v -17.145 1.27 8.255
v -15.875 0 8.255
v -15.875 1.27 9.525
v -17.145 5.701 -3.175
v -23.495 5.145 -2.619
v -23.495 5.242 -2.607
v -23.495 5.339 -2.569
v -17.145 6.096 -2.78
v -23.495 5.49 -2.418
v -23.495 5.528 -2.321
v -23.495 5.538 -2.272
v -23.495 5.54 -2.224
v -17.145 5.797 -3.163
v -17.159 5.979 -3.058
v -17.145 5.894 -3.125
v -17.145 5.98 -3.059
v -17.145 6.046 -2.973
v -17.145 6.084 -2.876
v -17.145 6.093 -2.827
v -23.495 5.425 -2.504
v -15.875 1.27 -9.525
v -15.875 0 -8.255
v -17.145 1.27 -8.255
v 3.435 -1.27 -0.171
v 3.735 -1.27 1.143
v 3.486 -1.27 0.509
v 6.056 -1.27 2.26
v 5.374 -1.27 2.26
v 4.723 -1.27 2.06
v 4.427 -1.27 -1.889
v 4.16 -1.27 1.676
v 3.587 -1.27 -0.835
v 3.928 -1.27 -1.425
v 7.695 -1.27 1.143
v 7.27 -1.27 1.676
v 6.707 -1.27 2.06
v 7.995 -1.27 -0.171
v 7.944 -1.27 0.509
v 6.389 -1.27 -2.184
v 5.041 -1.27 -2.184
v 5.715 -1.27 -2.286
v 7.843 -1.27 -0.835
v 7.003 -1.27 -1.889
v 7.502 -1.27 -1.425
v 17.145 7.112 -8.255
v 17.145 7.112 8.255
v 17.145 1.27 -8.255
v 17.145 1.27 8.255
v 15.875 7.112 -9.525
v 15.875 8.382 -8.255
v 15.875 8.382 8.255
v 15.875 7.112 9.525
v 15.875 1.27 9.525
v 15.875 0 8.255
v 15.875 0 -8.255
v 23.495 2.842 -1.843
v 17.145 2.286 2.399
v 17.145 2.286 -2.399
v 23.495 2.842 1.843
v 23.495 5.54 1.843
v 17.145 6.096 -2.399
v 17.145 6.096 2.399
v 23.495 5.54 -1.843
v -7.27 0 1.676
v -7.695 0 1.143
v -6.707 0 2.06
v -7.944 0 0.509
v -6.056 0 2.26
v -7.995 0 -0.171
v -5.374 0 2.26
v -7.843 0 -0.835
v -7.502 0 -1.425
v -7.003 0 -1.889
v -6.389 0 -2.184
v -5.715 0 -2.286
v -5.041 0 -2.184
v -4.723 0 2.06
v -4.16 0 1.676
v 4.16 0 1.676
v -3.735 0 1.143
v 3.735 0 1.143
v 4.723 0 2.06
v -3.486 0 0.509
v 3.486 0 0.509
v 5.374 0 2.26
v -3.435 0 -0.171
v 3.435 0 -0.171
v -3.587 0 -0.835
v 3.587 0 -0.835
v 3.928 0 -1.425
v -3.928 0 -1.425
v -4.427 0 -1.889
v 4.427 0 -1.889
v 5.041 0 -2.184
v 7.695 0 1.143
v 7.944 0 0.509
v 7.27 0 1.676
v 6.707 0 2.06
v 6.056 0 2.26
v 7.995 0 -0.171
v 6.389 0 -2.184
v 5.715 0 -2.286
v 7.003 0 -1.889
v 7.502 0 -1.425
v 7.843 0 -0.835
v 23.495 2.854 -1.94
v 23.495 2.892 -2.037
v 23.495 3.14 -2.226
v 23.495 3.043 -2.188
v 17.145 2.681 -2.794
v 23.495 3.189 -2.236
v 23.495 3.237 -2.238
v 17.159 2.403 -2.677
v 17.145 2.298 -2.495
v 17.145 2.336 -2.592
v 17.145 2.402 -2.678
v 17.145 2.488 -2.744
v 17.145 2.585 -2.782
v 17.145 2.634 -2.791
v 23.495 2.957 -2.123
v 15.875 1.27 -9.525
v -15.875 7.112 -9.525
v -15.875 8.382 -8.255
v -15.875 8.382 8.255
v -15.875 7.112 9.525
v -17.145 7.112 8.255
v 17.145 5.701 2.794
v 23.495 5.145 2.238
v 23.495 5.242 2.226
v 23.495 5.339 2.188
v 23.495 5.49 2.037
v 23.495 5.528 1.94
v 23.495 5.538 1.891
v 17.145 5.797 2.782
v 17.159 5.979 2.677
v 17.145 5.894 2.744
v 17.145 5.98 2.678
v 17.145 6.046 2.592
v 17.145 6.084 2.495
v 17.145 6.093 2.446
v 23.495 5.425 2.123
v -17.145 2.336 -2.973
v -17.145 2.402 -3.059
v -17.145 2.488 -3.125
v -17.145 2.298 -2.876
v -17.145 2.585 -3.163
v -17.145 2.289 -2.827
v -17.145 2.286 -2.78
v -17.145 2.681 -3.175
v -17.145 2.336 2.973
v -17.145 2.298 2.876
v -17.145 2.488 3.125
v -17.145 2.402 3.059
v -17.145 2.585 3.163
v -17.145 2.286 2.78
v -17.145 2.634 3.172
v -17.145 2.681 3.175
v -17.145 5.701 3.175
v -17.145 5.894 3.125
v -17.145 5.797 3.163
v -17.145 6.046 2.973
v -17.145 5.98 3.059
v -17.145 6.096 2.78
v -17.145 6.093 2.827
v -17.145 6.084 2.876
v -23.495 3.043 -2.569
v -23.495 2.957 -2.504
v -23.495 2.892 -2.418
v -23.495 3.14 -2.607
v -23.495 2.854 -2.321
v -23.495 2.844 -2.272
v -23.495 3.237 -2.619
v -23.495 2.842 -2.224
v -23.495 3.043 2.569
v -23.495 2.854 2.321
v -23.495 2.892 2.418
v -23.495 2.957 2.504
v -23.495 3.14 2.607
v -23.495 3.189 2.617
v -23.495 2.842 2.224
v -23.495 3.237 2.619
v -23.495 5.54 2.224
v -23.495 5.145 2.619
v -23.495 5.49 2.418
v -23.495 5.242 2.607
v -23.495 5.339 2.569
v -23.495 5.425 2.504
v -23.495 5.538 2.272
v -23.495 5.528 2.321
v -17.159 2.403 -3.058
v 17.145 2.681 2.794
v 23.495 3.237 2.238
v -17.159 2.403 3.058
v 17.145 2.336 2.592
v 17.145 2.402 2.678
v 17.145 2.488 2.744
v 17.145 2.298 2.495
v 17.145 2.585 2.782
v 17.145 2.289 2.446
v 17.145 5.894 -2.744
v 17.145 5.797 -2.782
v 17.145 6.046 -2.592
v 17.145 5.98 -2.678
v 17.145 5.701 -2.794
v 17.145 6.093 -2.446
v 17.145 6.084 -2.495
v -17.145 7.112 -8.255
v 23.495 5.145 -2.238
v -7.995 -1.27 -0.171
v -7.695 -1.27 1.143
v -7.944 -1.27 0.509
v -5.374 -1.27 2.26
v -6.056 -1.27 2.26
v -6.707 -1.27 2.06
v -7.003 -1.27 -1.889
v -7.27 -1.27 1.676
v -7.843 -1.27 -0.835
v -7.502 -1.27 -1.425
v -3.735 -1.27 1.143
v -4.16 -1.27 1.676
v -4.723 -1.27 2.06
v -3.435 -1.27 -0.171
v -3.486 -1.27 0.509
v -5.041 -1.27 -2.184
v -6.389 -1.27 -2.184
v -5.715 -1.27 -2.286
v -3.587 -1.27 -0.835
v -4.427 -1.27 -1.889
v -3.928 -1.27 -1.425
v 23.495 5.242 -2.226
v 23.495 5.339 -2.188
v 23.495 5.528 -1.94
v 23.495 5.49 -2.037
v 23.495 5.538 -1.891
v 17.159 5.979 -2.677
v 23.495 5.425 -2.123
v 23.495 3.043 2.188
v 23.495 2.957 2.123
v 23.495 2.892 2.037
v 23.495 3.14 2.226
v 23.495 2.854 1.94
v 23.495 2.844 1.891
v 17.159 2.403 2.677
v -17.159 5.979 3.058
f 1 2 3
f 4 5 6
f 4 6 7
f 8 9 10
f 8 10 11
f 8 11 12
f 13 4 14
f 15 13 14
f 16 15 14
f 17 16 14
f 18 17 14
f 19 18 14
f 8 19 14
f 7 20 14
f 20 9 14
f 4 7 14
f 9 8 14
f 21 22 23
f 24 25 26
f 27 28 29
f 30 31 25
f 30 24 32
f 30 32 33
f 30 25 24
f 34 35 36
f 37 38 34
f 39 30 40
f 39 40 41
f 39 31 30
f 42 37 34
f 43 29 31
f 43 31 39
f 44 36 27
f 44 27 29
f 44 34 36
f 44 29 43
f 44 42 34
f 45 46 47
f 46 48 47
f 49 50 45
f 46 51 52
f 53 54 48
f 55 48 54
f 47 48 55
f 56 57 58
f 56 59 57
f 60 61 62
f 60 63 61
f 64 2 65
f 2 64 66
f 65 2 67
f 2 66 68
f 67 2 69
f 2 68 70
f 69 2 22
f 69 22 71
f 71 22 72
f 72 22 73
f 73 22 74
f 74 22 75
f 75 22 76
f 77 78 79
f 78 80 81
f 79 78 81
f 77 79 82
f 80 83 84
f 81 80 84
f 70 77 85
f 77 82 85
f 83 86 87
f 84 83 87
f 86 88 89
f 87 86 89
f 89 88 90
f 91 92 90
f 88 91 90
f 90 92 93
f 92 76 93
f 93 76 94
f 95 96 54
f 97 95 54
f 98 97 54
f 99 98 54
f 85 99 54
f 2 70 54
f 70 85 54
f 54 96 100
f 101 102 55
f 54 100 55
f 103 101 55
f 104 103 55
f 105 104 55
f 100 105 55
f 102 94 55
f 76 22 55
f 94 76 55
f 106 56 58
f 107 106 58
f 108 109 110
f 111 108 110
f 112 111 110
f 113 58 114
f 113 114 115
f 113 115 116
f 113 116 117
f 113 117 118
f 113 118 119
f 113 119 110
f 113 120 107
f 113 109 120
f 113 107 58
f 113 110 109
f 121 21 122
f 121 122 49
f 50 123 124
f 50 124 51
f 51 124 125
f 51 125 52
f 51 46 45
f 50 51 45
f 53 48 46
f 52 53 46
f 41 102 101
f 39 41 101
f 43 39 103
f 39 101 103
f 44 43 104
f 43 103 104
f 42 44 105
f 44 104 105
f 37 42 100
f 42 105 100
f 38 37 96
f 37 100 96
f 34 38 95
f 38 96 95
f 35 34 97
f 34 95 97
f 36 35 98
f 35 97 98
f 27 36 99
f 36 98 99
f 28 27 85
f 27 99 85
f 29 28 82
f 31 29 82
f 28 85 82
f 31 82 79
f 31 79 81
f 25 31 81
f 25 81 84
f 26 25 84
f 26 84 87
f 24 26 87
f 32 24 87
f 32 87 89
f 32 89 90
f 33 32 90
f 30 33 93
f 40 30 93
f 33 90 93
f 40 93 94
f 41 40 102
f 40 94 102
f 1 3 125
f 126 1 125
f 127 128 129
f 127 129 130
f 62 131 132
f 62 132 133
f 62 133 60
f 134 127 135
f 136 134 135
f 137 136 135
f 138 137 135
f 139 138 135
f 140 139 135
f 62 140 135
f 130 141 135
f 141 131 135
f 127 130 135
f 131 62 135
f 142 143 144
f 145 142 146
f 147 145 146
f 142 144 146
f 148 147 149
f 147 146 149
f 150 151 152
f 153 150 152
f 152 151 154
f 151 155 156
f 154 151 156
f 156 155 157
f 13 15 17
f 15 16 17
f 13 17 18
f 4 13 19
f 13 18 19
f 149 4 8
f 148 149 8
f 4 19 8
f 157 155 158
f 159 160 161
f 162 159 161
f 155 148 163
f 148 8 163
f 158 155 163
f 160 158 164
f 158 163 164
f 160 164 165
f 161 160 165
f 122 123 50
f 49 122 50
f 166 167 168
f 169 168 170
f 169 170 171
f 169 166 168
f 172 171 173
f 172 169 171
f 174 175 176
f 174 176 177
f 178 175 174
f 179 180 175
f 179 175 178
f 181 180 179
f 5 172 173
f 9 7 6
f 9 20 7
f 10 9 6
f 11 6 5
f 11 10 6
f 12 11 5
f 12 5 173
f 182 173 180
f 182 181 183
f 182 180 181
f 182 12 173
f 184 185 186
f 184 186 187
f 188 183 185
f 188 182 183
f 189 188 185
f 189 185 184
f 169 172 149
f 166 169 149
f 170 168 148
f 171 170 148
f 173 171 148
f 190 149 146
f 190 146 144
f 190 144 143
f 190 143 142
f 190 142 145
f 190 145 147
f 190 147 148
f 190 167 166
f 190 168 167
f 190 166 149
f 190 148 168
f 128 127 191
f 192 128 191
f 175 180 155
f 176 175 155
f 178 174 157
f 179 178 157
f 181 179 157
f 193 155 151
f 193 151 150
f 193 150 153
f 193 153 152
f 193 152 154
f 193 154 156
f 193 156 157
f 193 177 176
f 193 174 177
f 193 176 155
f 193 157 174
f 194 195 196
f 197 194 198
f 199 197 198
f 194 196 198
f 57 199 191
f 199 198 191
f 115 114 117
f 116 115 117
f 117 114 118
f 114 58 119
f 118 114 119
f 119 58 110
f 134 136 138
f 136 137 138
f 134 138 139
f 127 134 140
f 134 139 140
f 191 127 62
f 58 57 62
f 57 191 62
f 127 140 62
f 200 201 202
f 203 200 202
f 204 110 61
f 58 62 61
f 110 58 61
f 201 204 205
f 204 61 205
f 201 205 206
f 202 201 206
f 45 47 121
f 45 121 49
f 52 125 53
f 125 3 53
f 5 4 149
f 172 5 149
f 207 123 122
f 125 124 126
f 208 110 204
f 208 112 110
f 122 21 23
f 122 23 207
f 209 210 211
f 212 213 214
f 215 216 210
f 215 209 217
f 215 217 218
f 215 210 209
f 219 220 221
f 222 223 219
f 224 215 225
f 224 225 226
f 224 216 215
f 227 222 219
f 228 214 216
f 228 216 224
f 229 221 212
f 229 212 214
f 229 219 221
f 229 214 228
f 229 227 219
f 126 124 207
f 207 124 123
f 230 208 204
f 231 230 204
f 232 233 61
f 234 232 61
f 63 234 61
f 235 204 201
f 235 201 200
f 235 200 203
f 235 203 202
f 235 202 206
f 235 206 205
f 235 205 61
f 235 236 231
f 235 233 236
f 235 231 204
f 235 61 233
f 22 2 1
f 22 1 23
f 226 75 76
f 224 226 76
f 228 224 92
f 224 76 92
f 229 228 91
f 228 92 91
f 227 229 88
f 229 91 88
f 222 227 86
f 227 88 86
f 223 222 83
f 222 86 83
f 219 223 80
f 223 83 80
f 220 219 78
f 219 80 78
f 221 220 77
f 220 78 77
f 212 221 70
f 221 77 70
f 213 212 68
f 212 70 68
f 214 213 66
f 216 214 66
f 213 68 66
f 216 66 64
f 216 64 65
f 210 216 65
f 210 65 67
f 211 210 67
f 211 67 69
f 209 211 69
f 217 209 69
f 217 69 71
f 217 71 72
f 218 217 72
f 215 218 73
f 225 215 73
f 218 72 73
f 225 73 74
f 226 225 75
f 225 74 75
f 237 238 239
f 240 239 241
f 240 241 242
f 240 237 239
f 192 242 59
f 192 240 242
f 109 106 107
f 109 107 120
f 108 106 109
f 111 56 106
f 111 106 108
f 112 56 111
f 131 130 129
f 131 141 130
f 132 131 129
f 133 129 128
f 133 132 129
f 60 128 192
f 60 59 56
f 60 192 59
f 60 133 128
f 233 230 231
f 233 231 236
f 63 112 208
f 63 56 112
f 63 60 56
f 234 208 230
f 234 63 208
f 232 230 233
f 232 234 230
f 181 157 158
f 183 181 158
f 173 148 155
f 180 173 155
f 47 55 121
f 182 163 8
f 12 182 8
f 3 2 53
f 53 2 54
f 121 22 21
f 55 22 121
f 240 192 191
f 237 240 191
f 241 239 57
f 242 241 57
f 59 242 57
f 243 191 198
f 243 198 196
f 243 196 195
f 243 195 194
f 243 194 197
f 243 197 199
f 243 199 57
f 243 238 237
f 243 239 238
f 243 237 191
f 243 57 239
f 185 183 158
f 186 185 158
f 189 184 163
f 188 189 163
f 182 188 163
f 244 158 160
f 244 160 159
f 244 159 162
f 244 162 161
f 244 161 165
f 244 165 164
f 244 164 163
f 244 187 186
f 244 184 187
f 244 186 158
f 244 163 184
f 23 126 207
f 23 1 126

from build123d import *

# Parameters (mm, degrees)
SKETCH1_W           = 34.29
SKETCH1_H           = 19.05
BOSS_EXTRUDE1_DEPTH = 8.382
SKETCH2_R           = 2.286
BOSS_EXTRUDE2_DEPTH = 1.27
SKETCH3_W           = 6.35
SKETCH3_H           = 3.81
BOSS_EXTRUDE3_DEPTH = 6.35
BOSS_EXTRUDE3_TAPER = 5
SKETCH4_W           = 5.588
SKETCH4_H           = 3.81
BOSS_EXTRUDE4_DEPTH = 6.35
BOSS_EXTRUDE4_TAPER = 5
CHAMFER1_SIZE       = 1.27
FILLET1_R           = 0.396875
FILLET2_R           = 0.396875


with BuildPart() as part:
    # Sketch1 → Boss-Extrude1 (new body)
    with BuildSketch(Plane(origin=(0, 0, 0), x_dir=(1, 0, 0), z_dir=(0, 1, 0))):
        Rectangle(SKETCH1_W, SKETCH1_H)
    extrude(amount=BOSS_EXTRUDE1_DEPTH)

    # Sketch2 → Boss-Extrude2 (add)
    with BuildSketch(Plane(origin=(0, 0, 0), x_dir=(-1, 0, 0), z_dir=(0, -1, 0))):
        with Locations(Location((5.715, 0, 0), (0, 0, 90))):
            Circle(SKETCH2_R)
        with Locations(Location((-5.715, 0, 0), (0, 0, 90))):
            Circle(SKETCH2_R)
    extrude(amount=BOSS_EXTRUDE2_DEPTH)

    # Chamfer1
    chamfer1_edges = [part.edges().sort_by_distance(p)[0] for p in [
        (-17.145, 8.382, 0),
        (0, 8.382, 9.525),
        (17.145, 8.382, 0),
        (0, 0, 9.525),
        (-17.145, 0, 0),
        (0, 0, -9.525),
        (17.145, 0, 0),
        (0, 8.382, -9.525),
        (17.145, 4.191, 9.525),
        (-17.145, 4.191, 9.525),
        (-17.145, 4.191, -9.525),
        (17.145, 4.191, -9.525),
    ]]
    chamfer(chamfer1_edges, length=CHAMFER1_SIZE)


with BuildPart() as body_2:
    # Sketch3 → Boss-Extrude3 (new body)
    with BuildSketch(Plane.ZY.offset(17.145)):
        with Locations((0, 4.191)):
            Rectangle(SKETCH3_W, SKETCH3_H)
    extrude(amount=BOSS_EXTRUDE3_DEPTH, taper=BOSS_EXTRUDE3_TAPER)

    # Fillet2
    fillet2_edges = [body_2.edges().sort_by_distance(p)[0] for p in [
        (-20.32, 2.563776507, 2.897223493),
        (-20.32, 2.563776507, -2.897223493),
        (-20.32, 5.818223493, -2.897223493),
        (-20.32, 5.818223493, 2.897223493),
    ]]
    fillet(fillet2_edges, radius=FILLET2_R)


with BuildPart() as body_3:
    # Sketch4 → Boss-Extrude4 (new body)
    with BuildSketch(Plane(origin=(17.145, 0, 0), x_dir=(0, 0, -1), z_dir=(1, 0, 0))):
        with Locations((0, 4.191)):
            Rectangle(SKETCH4_W, SKETCH4_H)
    extrude(amount=BOSS_EXTRUDE4_DEPTH, taper=BOSS_EXTRUDE4_TAPER)

    # Fillet1
    fillet1_edges = [body_3.edges().sort_by_distance(p)[0] for p in [
        (20.32, 2.563776507, -2.516223493),
        (20.32, 2.563776507, 2.516223493),
        (20.32, 5.818223493, 2.516223493),
        (20.32, 5.818223493, -2.516223493),
    ]]
    fillet(fillet1_edges, radius=FILLET1_R)


solid = Compound([part.part, body_2.part, body_3.part])
